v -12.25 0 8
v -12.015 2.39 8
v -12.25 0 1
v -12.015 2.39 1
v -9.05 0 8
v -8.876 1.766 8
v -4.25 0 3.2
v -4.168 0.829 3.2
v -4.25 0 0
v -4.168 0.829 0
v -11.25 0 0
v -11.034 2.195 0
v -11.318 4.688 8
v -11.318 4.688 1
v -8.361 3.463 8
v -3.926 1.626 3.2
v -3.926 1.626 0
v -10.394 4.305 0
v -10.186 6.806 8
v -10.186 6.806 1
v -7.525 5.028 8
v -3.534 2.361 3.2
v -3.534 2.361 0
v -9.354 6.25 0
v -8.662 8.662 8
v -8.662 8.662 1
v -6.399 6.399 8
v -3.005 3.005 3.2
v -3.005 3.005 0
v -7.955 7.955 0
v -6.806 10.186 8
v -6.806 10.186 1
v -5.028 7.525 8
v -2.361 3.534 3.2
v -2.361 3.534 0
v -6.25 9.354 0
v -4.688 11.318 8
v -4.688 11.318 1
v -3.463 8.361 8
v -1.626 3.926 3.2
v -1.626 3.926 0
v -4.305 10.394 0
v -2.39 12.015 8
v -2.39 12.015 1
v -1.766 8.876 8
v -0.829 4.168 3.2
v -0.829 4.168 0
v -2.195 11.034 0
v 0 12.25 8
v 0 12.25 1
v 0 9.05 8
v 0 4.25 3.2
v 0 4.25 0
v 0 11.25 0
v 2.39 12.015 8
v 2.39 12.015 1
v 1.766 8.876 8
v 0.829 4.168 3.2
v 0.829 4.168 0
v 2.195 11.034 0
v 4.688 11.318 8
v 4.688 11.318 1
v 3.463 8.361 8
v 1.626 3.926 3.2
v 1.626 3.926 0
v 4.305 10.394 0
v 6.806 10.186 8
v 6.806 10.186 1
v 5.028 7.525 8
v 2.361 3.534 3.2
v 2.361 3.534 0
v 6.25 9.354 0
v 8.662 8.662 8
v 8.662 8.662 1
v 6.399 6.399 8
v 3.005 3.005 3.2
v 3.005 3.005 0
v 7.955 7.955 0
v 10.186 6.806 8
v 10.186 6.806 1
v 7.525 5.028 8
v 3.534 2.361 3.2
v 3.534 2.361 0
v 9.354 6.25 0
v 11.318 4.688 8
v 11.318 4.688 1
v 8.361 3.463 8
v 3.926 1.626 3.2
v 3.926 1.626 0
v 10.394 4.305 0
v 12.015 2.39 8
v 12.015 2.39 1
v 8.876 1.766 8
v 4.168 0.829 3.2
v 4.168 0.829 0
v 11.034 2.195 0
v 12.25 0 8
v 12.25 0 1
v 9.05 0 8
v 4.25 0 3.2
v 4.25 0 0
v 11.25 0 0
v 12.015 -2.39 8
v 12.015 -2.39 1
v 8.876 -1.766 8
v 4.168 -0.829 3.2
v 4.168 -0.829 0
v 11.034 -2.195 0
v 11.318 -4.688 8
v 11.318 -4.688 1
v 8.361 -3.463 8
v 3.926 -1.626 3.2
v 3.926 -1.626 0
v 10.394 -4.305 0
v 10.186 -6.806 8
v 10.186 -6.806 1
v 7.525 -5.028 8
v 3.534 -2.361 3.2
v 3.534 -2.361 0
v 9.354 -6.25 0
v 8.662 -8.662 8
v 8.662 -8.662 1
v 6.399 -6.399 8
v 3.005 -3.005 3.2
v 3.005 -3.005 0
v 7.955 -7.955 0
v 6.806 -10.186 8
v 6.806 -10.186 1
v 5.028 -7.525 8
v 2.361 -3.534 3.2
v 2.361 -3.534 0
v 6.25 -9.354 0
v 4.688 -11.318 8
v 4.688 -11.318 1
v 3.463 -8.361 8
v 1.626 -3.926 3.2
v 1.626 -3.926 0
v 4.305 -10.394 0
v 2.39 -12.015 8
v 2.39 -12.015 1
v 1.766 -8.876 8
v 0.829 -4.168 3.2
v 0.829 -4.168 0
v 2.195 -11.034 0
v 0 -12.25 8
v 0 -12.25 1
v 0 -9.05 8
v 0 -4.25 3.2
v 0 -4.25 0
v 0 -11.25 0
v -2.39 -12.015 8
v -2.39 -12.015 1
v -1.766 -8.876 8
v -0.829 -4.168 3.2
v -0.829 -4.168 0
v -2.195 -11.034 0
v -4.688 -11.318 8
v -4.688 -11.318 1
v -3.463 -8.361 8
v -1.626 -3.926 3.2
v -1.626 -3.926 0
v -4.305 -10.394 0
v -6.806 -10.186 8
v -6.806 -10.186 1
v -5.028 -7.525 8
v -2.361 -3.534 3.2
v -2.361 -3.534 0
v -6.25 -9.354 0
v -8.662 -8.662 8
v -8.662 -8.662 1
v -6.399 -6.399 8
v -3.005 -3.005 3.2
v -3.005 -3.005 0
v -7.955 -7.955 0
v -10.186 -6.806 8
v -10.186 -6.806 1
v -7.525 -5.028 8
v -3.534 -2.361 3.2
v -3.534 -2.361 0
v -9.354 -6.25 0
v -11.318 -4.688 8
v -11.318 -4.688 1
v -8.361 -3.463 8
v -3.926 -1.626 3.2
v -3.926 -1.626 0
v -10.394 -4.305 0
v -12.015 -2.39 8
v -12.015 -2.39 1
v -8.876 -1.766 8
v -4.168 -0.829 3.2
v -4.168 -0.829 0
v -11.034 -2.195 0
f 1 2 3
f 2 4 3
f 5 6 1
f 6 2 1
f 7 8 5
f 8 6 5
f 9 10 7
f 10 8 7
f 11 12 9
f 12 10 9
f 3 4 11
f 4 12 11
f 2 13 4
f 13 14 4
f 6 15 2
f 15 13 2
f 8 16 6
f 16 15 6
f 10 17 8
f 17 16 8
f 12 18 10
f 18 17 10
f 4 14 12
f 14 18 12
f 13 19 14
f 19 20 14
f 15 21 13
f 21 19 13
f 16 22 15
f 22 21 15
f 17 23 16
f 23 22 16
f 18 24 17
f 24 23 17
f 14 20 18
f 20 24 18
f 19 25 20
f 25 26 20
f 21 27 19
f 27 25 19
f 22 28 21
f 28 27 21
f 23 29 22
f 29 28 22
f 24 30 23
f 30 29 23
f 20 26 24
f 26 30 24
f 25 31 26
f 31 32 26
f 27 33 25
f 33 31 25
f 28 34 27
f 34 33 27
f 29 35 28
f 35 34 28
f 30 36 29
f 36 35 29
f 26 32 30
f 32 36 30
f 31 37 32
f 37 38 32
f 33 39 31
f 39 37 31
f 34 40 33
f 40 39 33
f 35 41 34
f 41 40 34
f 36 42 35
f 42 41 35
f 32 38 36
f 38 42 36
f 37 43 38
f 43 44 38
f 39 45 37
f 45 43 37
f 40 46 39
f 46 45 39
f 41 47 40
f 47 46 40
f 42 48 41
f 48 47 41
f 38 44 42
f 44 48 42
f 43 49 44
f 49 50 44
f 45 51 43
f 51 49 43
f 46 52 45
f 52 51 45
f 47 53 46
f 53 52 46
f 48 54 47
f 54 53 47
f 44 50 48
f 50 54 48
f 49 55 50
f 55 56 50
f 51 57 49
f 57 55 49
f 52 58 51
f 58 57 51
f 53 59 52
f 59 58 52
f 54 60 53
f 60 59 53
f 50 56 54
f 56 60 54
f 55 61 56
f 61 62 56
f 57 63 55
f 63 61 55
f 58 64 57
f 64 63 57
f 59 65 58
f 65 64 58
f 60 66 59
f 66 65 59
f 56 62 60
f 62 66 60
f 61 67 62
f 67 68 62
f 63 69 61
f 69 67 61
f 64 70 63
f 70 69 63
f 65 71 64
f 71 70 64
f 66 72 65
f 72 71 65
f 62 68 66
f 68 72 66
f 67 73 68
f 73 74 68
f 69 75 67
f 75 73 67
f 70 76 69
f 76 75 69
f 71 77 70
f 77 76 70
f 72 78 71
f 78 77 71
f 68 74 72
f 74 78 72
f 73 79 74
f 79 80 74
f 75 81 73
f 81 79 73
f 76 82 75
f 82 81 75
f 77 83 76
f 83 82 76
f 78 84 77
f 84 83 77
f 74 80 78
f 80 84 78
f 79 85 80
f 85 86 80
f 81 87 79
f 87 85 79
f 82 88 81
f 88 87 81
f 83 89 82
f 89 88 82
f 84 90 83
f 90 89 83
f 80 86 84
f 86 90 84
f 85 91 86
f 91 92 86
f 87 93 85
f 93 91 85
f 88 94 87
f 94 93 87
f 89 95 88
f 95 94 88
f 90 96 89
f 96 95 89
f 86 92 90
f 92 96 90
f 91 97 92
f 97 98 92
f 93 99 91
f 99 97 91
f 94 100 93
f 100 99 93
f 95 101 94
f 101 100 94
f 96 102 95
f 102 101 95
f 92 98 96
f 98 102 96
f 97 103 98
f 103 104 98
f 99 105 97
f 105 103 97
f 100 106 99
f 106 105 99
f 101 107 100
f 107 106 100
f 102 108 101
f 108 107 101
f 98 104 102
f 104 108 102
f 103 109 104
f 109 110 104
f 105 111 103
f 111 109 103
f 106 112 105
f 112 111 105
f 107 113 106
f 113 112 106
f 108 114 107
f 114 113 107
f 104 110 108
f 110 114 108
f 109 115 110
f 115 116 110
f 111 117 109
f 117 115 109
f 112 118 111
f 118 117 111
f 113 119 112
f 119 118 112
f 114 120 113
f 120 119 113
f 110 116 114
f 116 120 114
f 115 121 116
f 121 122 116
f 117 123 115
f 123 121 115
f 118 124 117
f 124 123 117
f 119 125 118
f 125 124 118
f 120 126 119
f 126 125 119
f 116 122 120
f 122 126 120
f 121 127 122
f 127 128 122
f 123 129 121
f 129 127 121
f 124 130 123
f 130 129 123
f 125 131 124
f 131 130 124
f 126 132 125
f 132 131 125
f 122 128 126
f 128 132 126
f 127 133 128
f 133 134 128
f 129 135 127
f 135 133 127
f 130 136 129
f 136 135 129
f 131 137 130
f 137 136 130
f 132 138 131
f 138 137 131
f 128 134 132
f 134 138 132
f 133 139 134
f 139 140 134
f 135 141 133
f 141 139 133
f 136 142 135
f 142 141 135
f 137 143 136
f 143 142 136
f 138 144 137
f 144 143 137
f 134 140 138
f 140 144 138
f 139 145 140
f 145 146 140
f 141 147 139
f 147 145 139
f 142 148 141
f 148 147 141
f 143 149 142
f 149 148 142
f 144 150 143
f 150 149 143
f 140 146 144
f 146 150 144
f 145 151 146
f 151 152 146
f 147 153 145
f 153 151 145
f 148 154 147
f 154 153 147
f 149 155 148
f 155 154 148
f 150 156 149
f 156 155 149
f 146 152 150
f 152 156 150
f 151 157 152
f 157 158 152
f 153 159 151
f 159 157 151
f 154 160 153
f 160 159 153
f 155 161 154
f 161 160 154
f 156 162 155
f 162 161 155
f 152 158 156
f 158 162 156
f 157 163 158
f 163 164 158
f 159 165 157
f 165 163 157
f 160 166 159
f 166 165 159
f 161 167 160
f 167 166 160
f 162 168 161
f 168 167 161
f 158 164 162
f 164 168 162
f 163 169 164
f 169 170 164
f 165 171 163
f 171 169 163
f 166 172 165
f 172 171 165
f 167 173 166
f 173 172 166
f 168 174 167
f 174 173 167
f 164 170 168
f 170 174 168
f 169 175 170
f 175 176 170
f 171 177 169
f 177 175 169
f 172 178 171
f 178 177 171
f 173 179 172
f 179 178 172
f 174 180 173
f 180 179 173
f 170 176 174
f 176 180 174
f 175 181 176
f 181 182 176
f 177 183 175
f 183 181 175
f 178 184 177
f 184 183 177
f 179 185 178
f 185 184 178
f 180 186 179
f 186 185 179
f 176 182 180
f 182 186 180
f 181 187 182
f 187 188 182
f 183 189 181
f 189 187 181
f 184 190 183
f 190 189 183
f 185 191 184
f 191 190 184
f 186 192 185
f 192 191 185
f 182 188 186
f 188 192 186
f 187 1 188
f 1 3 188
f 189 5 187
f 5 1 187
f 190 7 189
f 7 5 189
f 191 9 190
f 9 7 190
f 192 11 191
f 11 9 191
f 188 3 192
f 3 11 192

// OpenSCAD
$fn = 32;

// ----------------------------------------------------------------------
// Form washer: countersunk washer, 24.5 mm outside, 8.5 mm bore
// ----------------------------------------------------------------------

// --- parameters (mm) ---
revolve_angle = 360;      // full turn around the Z axis
profile_points = 6;       // points of the closed outline

profile = [[4.25, 0], [11.25, 0], [12.25, 1], [12.25, 8], [9.05, 8], [4.25, 3.2]];  // single closed polygon, 6 points, counter clockwise

// --- the one profile operation ---
rotate_extrude(angle = revolve_angle) polygon(points = profile);
